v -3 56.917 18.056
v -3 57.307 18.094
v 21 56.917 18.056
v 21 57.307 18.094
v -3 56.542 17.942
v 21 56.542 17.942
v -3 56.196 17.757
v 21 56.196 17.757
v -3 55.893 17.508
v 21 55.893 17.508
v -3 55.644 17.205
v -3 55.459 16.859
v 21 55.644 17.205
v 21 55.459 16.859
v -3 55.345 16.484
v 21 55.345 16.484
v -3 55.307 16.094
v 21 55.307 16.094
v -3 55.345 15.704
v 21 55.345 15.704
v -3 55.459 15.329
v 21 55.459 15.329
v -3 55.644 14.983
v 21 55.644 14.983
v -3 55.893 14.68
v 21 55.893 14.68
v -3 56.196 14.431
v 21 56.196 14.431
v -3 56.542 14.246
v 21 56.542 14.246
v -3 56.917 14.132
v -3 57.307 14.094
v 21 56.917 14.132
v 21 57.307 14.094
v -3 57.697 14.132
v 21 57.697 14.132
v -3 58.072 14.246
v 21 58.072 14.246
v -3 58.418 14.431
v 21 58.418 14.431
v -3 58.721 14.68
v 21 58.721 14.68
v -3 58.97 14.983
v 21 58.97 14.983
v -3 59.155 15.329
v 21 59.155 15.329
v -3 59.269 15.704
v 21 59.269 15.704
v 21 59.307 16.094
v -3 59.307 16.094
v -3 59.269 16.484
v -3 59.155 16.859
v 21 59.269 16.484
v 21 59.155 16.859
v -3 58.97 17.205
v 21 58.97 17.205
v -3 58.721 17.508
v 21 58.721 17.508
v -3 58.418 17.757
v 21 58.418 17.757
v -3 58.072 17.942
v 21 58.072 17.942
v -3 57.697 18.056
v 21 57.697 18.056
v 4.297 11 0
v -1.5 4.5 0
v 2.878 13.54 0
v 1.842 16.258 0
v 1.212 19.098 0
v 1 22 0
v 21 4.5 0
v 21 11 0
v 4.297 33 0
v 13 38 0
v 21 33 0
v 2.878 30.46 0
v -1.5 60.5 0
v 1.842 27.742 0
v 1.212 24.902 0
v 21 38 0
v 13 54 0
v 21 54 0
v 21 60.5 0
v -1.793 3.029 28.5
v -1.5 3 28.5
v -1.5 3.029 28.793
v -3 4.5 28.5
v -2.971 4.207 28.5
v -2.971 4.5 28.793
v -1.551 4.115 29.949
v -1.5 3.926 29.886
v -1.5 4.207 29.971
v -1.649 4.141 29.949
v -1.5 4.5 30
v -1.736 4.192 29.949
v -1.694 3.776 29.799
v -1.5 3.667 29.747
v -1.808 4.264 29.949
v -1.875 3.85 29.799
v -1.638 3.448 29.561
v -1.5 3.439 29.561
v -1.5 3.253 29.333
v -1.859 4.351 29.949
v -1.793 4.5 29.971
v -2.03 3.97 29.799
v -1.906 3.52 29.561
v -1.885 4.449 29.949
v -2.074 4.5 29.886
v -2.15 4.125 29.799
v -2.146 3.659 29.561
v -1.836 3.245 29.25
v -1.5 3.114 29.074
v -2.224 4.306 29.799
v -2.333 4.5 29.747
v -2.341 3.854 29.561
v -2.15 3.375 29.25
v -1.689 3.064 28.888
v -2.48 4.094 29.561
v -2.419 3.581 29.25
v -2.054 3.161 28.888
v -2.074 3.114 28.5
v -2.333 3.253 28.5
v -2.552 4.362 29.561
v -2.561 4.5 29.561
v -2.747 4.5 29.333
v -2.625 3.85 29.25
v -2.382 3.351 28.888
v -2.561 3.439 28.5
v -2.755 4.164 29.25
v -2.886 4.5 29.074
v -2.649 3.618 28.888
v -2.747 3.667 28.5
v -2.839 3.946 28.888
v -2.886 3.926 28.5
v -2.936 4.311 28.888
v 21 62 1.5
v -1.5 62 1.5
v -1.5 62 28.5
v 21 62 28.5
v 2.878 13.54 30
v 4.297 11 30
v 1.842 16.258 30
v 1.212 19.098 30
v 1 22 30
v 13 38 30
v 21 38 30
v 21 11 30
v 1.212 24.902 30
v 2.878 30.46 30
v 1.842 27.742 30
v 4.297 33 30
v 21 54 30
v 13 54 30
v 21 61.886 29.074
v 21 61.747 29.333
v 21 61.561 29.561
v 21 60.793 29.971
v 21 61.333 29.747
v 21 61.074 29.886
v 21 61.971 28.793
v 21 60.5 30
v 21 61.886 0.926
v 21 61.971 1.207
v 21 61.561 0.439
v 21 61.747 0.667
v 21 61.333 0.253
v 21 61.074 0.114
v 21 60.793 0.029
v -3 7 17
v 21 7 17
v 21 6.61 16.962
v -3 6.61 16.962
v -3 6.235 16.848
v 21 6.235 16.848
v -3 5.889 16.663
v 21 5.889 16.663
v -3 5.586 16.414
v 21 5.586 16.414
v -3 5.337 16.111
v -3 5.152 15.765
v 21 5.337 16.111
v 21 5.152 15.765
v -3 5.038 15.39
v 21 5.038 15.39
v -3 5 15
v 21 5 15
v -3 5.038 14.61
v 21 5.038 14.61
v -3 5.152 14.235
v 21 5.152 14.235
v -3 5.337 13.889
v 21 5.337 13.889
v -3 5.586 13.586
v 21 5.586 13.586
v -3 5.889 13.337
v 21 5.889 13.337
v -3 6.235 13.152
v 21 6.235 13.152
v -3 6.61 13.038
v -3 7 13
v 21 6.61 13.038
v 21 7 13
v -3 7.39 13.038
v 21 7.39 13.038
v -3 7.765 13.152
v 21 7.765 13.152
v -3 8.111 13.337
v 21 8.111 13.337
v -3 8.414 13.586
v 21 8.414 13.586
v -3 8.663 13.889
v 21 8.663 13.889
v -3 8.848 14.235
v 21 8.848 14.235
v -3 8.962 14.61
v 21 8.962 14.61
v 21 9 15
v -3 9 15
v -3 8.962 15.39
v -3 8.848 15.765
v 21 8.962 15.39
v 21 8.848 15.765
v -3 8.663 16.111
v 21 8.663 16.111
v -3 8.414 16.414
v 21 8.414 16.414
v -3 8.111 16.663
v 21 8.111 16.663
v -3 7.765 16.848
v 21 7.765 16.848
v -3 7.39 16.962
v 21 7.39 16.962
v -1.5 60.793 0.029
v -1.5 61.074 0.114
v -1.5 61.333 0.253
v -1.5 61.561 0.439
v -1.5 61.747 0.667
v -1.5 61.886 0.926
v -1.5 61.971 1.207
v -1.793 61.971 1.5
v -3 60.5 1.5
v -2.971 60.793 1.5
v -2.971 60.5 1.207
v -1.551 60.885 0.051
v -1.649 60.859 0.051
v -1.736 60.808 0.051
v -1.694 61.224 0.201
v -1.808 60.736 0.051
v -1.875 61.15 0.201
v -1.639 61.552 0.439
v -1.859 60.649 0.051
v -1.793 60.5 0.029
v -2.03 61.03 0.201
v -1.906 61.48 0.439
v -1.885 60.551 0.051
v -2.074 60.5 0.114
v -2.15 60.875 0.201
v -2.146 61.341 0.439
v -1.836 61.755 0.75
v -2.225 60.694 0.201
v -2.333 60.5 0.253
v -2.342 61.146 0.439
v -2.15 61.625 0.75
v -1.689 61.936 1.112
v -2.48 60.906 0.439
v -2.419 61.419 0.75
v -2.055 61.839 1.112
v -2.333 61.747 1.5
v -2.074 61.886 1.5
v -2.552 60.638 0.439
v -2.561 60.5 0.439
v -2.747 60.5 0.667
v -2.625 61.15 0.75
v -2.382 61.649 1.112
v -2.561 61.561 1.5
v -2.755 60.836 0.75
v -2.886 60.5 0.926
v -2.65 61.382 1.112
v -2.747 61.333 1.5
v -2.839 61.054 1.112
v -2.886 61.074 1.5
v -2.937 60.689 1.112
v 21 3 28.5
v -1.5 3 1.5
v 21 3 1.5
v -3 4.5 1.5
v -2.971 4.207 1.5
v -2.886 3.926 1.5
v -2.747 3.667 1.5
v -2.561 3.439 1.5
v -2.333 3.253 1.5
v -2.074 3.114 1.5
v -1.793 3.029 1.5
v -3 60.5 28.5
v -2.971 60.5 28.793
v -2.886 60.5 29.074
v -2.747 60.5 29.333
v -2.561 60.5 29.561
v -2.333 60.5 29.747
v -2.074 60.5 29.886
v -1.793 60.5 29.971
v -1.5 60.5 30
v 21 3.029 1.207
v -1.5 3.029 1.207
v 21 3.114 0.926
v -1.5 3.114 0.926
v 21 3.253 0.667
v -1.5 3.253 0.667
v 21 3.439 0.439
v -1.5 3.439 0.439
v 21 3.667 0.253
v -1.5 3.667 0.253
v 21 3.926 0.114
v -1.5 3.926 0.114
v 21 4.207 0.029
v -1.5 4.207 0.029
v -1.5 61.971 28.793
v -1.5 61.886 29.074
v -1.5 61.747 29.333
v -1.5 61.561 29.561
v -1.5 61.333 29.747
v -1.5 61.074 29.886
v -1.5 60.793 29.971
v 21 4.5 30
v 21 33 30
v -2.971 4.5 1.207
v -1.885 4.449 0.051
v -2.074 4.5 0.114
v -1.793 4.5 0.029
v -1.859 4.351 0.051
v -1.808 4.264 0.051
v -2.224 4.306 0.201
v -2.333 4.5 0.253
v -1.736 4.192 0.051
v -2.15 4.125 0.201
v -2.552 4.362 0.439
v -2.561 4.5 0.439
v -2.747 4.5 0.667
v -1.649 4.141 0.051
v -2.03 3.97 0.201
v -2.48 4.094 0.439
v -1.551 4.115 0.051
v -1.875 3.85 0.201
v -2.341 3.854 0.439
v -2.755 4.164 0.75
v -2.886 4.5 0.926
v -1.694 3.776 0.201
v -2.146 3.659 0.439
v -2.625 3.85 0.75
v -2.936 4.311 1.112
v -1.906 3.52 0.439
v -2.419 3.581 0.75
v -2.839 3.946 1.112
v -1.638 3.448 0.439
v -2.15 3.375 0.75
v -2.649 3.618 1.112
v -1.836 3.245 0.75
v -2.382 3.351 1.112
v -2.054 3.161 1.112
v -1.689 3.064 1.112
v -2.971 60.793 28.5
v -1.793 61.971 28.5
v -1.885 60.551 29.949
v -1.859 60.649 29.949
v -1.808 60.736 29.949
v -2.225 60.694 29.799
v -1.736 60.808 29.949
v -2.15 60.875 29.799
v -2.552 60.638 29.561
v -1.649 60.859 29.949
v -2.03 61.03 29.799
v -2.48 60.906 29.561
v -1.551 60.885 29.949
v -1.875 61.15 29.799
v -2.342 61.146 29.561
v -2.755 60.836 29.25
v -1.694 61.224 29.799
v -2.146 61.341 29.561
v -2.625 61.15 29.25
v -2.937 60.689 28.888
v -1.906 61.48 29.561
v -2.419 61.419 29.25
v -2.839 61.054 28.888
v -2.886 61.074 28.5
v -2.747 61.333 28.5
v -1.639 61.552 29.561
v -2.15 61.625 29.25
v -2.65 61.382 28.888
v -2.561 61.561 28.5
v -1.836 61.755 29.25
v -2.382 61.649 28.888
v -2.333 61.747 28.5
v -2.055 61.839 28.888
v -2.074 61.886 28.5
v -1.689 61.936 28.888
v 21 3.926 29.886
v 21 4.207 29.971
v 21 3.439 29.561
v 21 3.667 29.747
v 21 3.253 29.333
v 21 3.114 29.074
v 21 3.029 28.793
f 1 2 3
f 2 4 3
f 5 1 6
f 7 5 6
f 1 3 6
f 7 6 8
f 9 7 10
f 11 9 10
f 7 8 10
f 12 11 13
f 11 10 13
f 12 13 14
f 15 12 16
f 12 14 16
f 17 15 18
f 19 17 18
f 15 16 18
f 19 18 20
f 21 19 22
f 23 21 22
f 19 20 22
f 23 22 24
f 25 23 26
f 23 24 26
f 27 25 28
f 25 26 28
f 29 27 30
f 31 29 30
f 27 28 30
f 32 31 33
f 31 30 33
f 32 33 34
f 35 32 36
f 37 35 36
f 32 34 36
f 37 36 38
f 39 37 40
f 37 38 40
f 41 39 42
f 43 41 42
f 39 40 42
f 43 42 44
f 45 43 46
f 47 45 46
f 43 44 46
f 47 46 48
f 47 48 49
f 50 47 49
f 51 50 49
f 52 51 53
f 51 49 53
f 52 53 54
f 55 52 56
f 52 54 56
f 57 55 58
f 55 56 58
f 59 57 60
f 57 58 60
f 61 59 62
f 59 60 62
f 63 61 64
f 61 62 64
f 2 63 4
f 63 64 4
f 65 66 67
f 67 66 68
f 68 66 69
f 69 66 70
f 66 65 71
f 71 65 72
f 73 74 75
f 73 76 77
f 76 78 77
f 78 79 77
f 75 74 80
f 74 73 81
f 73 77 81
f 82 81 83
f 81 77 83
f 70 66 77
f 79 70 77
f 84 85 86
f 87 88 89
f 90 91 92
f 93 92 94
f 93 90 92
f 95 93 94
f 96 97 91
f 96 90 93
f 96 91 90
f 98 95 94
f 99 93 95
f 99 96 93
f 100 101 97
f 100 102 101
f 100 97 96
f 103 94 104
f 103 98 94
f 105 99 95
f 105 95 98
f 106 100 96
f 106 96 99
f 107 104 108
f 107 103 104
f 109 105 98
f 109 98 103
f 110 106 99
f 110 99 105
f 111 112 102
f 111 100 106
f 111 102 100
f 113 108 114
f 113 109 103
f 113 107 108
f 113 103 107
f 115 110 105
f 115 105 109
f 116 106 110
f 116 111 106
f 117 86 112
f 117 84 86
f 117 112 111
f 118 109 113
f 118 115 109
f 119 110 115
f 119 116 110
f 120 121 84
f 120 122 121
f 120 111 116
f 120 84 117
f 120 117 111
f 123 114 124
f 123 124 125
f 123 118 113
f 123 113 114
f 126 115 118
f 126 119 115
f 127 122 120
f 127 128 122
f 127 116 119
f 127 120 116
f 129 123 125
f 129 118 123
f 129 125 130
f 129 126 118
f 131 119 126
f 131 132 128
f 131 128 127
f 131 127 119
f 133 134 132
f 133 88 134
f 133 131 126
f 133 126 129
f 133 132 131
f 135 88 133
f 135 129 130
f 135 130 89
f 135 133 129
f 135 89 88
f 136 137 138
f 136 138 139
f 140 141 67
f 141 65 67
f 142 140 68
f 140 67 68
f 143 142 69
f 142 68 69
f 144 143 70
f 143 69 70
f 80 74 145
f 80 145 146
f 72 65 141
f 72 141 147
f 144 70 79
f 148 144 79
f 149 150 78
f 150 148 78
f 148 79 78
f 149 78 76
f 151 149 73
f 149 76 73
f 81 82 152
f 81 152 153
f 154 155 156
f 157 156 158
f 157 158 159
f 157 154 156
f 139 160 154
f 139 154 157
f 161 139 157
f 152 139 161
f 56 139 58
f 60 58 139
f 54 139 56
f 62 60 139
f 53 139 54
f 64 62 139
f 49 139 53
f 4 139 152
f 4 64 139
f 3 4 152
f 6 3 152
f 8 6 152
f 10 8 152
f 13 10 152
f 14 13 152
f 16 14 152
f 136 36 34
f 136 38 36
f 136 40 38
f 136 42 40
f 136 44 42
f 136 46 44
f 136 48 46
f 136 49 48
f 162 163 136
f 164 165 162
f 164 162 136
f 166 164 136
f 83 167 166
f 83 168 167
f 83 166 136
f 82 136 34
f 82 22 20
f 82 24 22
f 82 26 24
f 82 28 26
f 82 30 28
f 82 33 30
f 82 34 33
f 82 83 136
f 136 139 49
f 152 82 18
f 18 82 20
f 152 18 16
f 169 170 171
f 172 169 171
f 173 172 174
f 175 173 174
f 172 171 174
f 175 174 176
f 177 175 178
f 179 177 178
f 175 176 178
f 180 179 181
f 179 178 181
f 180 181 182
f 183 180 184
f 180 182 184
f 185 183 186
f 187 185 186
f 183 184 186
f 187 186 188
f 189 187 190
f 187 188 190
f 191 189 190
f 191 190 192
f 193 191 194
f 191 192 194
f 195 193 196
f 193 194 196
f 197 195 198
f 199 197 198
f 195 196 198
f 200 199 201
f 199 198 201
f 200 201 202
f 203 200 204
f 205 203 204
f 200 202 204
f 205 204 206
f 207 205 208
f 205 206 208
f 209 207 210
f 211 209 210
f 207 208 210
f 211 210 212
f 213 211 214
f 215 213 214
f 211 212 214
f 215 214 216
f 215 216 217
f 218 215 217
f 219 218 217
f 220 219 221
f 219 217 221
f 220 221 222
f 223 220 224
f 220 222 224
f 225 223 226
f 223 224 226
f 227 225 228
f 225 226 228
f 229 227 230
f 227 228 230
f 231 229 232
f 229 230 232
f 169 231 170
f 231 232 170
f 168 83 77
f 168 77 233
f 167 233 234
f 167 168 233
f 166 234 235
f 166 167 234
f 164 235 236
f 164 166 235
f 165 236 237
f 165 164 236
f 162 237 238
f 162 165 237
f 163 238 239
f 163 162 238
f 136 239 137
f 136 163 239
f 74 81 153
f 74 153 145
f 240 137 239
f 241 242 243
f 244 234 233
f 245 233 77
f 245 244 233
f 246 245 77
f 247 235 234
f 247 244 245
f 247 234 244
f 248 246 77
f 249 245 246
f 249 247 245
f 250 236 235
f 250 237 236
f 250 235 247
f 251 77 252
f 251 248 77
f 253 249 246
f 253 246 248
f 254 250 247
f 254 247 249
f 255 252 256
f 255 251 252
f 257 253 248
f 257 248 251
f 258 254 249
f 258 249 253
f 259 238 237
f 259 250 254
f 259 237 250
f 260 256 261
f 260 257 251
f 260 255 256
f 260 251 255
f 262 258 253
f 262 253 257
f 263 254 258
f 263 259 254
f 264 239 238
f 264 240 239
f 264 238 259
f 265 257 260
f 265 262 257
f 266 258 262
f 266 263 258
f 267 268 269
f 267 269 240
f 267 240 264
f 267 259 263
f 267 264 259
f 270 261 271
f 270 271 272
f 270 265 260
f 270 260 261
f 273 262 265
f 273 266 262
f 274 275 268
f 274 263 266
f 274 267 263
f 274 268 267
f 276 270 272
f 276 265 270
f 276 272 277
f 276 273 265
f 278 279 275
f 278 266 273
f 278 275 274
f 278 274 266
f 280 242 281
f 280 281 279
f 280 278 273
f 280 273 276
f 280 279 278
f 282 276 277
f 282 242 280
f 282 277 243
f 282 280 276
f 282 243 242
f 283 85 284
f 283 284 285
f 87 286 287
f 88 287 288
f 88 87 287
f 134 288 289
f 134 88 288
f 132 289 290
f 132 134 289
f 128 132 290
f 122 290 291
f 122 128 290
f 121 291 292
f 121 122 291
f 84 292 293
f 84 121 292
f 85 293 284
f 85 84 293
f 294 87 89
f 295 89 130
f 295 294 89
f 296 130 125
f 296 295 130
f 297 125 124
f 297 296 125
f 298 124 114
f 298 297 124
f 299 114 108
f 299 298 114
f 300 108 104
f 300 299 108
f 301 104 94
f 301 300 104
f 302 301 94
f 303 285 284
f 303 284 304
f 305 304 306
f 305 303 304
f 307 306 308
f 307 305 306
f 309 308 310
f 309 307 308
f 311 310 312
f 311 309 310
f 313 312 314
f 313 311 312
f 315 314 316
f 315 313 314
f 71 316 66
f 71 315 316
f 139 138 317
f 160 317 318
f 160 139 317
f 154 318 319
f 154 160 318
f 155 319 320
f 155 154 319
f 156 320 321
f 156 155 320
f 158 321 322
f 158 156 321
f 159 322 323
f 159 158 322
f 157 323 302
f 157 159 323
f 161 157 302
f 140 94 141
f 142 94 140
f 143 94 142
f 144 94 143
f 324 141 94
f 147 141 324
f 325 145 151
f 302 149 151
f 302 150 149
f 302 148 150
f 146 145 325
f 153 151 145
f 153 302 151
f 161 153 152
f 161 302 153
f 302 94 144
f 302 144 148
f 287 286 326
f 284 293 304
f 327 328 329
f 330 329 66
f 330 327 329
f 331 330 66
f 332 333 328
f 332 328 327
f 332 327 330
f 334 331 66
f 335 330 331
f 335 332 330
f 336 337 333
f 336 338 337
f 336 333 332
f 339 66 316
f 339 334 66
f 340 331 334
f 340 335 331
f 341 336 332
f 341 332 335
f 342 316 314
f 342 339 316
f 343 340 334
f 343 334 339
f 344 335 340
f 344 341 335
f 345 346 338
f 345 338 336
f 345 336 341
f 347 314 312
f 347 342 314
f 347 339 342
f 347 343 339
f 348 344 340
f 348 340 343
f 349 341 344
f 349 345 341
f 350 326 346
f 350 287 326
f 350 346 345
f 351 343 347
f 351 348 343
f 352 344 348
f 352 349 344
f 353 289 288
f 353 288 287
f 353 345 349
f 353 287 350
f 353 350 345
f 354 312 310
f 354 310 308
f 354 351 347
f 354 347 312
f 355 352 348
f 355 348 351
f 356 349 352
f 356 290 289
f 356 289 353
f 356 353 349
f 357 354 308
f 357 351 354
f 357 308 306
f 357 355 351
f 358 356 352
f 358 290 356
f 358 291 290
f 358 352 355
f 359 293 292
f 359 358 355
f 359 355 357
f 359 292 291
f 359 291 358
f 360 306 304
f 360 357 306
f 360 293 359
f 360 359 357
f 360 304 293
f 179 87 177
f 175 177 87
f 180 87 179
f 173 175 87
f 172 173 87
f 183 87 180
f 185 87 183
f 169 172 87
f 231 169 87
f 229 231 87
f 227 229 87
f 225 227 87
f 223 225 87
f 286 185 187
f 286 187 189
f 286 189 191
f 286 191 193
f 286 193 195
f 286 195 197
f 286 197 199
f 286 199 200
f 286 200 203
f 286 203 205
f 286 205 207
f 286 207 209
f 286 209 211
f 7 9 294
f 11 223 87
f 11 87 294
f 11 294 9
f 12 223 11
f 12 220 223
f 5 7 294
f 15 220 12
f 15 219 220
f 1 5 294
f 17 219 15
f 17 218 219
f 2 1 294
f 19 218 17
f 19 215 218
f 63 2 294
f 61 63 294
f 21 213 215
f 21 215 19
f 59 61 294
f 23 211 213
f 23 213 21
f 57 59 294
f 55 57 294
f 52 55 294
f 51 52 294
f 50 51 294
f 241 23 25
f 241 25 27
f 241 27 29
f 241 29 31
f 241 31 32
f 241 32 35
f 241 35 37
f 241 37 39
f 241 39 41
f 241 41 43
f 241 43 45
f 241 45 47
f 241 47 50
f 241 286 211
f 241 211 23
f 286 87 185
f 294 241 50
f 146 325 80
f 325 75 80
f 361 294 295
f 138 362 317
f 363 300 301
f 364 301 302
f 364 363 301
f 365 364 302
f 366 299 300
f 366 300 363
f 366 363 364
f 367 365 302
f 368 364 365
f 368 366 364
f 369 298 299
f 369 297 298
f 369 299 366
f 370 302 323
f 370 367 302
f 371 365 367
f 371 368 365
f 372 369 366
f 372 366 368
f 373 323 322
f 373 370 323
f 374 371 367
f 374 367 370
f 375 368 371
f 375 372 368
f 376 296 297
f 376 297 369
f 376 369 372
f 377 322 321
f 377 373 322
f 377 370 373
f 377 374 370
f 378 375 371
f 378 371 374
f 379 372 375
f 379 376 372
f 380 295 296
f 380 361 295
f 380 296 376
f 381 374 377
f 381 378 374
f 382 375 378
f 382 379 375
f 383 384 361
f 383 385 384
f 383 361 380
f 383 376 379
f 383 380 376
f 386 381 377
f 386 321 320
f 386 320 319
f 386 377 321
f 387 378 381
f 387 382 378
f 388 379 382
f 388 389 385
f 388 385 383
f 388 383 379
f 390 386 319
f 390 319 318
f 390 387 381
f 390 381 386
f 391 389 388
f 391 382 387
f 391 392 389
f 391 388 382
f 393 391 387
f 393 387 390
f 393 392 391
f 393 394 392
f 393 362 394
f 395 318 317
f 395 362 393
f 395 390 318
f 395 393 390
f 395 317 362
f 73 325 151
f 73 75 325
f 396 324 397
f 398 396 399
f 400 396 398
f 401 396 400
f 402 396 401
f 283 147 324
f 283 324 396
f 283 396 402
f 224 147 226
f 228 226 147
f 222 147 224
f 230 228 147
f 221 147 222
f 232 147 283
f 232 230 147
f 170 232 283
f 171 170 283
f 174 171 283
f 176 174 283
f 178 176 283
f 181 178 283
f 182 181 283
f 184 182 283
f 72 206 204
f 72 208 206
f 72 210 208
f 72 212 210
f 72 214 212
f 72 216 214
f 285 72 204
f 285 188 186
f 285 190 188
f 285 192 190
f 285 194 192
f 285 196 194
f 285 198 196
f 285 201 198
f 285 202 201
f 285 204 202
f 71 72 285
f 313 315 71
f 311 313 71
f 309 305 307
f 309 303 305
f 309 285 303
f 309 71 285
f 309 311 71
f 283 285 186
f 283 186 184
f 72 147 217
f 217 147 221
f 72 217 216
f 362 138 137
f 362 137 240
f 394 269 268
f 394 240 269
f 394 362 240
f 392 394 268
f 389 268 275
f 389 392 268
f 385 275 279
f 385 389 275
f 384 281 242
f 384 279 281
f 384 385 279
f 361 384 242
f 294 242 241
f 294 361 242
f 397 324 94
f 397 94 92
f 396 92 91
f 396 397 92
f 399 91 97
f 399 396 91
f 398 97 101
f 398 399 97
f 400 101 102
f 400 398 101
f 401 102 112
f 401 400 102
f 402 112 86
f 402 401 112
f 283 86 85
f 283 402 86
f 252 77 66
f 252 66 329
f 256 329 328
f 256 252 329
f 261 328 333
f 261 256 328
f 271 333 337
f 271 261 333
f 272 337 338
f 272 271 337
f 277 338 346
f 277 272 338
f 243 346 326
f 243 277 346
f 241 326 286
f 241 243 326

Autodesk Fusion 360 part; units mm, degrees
sketch "Esboço1" plane through (0, 0, 0) normal (0, 0, 1) x (1, 0, 0)
  line L0 (-3.0001, 62) -> (21, 62)
  line L1 (21, 62) -> (21, 54)
  line L2 (21, 54) -> (13, 54)
  line L3 (13, 54) -> (13, 38)
  line L4 (13, 38) -> (21, 38)
  line L5 (21, 11) -> (21, 3)
  line L6 (-3, 3) -> (-3, 62)
  line L7 (-3, 3) -> (21, 3)
  line L8 (21, 33) -> (21, 38)
  line L9 (-3.0001, 62) -> (-3, 62)
  line L10 (21, 33) -> (1, 33)
  line L11 (1, 11) -> (21, 11)
  arc A0 (1, 22) -> (4.2967, 11) centre (21, 22) ccw
  arc A1 (4.2967, 33) -> (1, 22) centre (21, 22) ccw
  dimension "d2" = 16
  dimension "d3" = 8
  dimension "d5" = 8
  dimension "d8" = 8
  dimension "d10" = 8
  dimension "d35" = 5
  dimension "d36" = 24
extrude "Extrusão1" add sketch "Esboço1" along normal blind 30
hole "Furo2" at (-3, 7, 15) direction (1, 0, 0) diameter 4 depth 25 tip angle 180
hole "Furo3" at (-3, 57.307, 16.094) direction (1, 0, 0) diameter 4 depth 25 tip angle 180
fillet "Arredondamento4" radius 1.5 8 edges at (9, 62, 30) (-3, 62, 15) (-3, 32.5, 30) (-3, 32.5, 0) (-3, 3, 15) (9, 3, 0) (9, 3, 30) (9, 62, 0)
